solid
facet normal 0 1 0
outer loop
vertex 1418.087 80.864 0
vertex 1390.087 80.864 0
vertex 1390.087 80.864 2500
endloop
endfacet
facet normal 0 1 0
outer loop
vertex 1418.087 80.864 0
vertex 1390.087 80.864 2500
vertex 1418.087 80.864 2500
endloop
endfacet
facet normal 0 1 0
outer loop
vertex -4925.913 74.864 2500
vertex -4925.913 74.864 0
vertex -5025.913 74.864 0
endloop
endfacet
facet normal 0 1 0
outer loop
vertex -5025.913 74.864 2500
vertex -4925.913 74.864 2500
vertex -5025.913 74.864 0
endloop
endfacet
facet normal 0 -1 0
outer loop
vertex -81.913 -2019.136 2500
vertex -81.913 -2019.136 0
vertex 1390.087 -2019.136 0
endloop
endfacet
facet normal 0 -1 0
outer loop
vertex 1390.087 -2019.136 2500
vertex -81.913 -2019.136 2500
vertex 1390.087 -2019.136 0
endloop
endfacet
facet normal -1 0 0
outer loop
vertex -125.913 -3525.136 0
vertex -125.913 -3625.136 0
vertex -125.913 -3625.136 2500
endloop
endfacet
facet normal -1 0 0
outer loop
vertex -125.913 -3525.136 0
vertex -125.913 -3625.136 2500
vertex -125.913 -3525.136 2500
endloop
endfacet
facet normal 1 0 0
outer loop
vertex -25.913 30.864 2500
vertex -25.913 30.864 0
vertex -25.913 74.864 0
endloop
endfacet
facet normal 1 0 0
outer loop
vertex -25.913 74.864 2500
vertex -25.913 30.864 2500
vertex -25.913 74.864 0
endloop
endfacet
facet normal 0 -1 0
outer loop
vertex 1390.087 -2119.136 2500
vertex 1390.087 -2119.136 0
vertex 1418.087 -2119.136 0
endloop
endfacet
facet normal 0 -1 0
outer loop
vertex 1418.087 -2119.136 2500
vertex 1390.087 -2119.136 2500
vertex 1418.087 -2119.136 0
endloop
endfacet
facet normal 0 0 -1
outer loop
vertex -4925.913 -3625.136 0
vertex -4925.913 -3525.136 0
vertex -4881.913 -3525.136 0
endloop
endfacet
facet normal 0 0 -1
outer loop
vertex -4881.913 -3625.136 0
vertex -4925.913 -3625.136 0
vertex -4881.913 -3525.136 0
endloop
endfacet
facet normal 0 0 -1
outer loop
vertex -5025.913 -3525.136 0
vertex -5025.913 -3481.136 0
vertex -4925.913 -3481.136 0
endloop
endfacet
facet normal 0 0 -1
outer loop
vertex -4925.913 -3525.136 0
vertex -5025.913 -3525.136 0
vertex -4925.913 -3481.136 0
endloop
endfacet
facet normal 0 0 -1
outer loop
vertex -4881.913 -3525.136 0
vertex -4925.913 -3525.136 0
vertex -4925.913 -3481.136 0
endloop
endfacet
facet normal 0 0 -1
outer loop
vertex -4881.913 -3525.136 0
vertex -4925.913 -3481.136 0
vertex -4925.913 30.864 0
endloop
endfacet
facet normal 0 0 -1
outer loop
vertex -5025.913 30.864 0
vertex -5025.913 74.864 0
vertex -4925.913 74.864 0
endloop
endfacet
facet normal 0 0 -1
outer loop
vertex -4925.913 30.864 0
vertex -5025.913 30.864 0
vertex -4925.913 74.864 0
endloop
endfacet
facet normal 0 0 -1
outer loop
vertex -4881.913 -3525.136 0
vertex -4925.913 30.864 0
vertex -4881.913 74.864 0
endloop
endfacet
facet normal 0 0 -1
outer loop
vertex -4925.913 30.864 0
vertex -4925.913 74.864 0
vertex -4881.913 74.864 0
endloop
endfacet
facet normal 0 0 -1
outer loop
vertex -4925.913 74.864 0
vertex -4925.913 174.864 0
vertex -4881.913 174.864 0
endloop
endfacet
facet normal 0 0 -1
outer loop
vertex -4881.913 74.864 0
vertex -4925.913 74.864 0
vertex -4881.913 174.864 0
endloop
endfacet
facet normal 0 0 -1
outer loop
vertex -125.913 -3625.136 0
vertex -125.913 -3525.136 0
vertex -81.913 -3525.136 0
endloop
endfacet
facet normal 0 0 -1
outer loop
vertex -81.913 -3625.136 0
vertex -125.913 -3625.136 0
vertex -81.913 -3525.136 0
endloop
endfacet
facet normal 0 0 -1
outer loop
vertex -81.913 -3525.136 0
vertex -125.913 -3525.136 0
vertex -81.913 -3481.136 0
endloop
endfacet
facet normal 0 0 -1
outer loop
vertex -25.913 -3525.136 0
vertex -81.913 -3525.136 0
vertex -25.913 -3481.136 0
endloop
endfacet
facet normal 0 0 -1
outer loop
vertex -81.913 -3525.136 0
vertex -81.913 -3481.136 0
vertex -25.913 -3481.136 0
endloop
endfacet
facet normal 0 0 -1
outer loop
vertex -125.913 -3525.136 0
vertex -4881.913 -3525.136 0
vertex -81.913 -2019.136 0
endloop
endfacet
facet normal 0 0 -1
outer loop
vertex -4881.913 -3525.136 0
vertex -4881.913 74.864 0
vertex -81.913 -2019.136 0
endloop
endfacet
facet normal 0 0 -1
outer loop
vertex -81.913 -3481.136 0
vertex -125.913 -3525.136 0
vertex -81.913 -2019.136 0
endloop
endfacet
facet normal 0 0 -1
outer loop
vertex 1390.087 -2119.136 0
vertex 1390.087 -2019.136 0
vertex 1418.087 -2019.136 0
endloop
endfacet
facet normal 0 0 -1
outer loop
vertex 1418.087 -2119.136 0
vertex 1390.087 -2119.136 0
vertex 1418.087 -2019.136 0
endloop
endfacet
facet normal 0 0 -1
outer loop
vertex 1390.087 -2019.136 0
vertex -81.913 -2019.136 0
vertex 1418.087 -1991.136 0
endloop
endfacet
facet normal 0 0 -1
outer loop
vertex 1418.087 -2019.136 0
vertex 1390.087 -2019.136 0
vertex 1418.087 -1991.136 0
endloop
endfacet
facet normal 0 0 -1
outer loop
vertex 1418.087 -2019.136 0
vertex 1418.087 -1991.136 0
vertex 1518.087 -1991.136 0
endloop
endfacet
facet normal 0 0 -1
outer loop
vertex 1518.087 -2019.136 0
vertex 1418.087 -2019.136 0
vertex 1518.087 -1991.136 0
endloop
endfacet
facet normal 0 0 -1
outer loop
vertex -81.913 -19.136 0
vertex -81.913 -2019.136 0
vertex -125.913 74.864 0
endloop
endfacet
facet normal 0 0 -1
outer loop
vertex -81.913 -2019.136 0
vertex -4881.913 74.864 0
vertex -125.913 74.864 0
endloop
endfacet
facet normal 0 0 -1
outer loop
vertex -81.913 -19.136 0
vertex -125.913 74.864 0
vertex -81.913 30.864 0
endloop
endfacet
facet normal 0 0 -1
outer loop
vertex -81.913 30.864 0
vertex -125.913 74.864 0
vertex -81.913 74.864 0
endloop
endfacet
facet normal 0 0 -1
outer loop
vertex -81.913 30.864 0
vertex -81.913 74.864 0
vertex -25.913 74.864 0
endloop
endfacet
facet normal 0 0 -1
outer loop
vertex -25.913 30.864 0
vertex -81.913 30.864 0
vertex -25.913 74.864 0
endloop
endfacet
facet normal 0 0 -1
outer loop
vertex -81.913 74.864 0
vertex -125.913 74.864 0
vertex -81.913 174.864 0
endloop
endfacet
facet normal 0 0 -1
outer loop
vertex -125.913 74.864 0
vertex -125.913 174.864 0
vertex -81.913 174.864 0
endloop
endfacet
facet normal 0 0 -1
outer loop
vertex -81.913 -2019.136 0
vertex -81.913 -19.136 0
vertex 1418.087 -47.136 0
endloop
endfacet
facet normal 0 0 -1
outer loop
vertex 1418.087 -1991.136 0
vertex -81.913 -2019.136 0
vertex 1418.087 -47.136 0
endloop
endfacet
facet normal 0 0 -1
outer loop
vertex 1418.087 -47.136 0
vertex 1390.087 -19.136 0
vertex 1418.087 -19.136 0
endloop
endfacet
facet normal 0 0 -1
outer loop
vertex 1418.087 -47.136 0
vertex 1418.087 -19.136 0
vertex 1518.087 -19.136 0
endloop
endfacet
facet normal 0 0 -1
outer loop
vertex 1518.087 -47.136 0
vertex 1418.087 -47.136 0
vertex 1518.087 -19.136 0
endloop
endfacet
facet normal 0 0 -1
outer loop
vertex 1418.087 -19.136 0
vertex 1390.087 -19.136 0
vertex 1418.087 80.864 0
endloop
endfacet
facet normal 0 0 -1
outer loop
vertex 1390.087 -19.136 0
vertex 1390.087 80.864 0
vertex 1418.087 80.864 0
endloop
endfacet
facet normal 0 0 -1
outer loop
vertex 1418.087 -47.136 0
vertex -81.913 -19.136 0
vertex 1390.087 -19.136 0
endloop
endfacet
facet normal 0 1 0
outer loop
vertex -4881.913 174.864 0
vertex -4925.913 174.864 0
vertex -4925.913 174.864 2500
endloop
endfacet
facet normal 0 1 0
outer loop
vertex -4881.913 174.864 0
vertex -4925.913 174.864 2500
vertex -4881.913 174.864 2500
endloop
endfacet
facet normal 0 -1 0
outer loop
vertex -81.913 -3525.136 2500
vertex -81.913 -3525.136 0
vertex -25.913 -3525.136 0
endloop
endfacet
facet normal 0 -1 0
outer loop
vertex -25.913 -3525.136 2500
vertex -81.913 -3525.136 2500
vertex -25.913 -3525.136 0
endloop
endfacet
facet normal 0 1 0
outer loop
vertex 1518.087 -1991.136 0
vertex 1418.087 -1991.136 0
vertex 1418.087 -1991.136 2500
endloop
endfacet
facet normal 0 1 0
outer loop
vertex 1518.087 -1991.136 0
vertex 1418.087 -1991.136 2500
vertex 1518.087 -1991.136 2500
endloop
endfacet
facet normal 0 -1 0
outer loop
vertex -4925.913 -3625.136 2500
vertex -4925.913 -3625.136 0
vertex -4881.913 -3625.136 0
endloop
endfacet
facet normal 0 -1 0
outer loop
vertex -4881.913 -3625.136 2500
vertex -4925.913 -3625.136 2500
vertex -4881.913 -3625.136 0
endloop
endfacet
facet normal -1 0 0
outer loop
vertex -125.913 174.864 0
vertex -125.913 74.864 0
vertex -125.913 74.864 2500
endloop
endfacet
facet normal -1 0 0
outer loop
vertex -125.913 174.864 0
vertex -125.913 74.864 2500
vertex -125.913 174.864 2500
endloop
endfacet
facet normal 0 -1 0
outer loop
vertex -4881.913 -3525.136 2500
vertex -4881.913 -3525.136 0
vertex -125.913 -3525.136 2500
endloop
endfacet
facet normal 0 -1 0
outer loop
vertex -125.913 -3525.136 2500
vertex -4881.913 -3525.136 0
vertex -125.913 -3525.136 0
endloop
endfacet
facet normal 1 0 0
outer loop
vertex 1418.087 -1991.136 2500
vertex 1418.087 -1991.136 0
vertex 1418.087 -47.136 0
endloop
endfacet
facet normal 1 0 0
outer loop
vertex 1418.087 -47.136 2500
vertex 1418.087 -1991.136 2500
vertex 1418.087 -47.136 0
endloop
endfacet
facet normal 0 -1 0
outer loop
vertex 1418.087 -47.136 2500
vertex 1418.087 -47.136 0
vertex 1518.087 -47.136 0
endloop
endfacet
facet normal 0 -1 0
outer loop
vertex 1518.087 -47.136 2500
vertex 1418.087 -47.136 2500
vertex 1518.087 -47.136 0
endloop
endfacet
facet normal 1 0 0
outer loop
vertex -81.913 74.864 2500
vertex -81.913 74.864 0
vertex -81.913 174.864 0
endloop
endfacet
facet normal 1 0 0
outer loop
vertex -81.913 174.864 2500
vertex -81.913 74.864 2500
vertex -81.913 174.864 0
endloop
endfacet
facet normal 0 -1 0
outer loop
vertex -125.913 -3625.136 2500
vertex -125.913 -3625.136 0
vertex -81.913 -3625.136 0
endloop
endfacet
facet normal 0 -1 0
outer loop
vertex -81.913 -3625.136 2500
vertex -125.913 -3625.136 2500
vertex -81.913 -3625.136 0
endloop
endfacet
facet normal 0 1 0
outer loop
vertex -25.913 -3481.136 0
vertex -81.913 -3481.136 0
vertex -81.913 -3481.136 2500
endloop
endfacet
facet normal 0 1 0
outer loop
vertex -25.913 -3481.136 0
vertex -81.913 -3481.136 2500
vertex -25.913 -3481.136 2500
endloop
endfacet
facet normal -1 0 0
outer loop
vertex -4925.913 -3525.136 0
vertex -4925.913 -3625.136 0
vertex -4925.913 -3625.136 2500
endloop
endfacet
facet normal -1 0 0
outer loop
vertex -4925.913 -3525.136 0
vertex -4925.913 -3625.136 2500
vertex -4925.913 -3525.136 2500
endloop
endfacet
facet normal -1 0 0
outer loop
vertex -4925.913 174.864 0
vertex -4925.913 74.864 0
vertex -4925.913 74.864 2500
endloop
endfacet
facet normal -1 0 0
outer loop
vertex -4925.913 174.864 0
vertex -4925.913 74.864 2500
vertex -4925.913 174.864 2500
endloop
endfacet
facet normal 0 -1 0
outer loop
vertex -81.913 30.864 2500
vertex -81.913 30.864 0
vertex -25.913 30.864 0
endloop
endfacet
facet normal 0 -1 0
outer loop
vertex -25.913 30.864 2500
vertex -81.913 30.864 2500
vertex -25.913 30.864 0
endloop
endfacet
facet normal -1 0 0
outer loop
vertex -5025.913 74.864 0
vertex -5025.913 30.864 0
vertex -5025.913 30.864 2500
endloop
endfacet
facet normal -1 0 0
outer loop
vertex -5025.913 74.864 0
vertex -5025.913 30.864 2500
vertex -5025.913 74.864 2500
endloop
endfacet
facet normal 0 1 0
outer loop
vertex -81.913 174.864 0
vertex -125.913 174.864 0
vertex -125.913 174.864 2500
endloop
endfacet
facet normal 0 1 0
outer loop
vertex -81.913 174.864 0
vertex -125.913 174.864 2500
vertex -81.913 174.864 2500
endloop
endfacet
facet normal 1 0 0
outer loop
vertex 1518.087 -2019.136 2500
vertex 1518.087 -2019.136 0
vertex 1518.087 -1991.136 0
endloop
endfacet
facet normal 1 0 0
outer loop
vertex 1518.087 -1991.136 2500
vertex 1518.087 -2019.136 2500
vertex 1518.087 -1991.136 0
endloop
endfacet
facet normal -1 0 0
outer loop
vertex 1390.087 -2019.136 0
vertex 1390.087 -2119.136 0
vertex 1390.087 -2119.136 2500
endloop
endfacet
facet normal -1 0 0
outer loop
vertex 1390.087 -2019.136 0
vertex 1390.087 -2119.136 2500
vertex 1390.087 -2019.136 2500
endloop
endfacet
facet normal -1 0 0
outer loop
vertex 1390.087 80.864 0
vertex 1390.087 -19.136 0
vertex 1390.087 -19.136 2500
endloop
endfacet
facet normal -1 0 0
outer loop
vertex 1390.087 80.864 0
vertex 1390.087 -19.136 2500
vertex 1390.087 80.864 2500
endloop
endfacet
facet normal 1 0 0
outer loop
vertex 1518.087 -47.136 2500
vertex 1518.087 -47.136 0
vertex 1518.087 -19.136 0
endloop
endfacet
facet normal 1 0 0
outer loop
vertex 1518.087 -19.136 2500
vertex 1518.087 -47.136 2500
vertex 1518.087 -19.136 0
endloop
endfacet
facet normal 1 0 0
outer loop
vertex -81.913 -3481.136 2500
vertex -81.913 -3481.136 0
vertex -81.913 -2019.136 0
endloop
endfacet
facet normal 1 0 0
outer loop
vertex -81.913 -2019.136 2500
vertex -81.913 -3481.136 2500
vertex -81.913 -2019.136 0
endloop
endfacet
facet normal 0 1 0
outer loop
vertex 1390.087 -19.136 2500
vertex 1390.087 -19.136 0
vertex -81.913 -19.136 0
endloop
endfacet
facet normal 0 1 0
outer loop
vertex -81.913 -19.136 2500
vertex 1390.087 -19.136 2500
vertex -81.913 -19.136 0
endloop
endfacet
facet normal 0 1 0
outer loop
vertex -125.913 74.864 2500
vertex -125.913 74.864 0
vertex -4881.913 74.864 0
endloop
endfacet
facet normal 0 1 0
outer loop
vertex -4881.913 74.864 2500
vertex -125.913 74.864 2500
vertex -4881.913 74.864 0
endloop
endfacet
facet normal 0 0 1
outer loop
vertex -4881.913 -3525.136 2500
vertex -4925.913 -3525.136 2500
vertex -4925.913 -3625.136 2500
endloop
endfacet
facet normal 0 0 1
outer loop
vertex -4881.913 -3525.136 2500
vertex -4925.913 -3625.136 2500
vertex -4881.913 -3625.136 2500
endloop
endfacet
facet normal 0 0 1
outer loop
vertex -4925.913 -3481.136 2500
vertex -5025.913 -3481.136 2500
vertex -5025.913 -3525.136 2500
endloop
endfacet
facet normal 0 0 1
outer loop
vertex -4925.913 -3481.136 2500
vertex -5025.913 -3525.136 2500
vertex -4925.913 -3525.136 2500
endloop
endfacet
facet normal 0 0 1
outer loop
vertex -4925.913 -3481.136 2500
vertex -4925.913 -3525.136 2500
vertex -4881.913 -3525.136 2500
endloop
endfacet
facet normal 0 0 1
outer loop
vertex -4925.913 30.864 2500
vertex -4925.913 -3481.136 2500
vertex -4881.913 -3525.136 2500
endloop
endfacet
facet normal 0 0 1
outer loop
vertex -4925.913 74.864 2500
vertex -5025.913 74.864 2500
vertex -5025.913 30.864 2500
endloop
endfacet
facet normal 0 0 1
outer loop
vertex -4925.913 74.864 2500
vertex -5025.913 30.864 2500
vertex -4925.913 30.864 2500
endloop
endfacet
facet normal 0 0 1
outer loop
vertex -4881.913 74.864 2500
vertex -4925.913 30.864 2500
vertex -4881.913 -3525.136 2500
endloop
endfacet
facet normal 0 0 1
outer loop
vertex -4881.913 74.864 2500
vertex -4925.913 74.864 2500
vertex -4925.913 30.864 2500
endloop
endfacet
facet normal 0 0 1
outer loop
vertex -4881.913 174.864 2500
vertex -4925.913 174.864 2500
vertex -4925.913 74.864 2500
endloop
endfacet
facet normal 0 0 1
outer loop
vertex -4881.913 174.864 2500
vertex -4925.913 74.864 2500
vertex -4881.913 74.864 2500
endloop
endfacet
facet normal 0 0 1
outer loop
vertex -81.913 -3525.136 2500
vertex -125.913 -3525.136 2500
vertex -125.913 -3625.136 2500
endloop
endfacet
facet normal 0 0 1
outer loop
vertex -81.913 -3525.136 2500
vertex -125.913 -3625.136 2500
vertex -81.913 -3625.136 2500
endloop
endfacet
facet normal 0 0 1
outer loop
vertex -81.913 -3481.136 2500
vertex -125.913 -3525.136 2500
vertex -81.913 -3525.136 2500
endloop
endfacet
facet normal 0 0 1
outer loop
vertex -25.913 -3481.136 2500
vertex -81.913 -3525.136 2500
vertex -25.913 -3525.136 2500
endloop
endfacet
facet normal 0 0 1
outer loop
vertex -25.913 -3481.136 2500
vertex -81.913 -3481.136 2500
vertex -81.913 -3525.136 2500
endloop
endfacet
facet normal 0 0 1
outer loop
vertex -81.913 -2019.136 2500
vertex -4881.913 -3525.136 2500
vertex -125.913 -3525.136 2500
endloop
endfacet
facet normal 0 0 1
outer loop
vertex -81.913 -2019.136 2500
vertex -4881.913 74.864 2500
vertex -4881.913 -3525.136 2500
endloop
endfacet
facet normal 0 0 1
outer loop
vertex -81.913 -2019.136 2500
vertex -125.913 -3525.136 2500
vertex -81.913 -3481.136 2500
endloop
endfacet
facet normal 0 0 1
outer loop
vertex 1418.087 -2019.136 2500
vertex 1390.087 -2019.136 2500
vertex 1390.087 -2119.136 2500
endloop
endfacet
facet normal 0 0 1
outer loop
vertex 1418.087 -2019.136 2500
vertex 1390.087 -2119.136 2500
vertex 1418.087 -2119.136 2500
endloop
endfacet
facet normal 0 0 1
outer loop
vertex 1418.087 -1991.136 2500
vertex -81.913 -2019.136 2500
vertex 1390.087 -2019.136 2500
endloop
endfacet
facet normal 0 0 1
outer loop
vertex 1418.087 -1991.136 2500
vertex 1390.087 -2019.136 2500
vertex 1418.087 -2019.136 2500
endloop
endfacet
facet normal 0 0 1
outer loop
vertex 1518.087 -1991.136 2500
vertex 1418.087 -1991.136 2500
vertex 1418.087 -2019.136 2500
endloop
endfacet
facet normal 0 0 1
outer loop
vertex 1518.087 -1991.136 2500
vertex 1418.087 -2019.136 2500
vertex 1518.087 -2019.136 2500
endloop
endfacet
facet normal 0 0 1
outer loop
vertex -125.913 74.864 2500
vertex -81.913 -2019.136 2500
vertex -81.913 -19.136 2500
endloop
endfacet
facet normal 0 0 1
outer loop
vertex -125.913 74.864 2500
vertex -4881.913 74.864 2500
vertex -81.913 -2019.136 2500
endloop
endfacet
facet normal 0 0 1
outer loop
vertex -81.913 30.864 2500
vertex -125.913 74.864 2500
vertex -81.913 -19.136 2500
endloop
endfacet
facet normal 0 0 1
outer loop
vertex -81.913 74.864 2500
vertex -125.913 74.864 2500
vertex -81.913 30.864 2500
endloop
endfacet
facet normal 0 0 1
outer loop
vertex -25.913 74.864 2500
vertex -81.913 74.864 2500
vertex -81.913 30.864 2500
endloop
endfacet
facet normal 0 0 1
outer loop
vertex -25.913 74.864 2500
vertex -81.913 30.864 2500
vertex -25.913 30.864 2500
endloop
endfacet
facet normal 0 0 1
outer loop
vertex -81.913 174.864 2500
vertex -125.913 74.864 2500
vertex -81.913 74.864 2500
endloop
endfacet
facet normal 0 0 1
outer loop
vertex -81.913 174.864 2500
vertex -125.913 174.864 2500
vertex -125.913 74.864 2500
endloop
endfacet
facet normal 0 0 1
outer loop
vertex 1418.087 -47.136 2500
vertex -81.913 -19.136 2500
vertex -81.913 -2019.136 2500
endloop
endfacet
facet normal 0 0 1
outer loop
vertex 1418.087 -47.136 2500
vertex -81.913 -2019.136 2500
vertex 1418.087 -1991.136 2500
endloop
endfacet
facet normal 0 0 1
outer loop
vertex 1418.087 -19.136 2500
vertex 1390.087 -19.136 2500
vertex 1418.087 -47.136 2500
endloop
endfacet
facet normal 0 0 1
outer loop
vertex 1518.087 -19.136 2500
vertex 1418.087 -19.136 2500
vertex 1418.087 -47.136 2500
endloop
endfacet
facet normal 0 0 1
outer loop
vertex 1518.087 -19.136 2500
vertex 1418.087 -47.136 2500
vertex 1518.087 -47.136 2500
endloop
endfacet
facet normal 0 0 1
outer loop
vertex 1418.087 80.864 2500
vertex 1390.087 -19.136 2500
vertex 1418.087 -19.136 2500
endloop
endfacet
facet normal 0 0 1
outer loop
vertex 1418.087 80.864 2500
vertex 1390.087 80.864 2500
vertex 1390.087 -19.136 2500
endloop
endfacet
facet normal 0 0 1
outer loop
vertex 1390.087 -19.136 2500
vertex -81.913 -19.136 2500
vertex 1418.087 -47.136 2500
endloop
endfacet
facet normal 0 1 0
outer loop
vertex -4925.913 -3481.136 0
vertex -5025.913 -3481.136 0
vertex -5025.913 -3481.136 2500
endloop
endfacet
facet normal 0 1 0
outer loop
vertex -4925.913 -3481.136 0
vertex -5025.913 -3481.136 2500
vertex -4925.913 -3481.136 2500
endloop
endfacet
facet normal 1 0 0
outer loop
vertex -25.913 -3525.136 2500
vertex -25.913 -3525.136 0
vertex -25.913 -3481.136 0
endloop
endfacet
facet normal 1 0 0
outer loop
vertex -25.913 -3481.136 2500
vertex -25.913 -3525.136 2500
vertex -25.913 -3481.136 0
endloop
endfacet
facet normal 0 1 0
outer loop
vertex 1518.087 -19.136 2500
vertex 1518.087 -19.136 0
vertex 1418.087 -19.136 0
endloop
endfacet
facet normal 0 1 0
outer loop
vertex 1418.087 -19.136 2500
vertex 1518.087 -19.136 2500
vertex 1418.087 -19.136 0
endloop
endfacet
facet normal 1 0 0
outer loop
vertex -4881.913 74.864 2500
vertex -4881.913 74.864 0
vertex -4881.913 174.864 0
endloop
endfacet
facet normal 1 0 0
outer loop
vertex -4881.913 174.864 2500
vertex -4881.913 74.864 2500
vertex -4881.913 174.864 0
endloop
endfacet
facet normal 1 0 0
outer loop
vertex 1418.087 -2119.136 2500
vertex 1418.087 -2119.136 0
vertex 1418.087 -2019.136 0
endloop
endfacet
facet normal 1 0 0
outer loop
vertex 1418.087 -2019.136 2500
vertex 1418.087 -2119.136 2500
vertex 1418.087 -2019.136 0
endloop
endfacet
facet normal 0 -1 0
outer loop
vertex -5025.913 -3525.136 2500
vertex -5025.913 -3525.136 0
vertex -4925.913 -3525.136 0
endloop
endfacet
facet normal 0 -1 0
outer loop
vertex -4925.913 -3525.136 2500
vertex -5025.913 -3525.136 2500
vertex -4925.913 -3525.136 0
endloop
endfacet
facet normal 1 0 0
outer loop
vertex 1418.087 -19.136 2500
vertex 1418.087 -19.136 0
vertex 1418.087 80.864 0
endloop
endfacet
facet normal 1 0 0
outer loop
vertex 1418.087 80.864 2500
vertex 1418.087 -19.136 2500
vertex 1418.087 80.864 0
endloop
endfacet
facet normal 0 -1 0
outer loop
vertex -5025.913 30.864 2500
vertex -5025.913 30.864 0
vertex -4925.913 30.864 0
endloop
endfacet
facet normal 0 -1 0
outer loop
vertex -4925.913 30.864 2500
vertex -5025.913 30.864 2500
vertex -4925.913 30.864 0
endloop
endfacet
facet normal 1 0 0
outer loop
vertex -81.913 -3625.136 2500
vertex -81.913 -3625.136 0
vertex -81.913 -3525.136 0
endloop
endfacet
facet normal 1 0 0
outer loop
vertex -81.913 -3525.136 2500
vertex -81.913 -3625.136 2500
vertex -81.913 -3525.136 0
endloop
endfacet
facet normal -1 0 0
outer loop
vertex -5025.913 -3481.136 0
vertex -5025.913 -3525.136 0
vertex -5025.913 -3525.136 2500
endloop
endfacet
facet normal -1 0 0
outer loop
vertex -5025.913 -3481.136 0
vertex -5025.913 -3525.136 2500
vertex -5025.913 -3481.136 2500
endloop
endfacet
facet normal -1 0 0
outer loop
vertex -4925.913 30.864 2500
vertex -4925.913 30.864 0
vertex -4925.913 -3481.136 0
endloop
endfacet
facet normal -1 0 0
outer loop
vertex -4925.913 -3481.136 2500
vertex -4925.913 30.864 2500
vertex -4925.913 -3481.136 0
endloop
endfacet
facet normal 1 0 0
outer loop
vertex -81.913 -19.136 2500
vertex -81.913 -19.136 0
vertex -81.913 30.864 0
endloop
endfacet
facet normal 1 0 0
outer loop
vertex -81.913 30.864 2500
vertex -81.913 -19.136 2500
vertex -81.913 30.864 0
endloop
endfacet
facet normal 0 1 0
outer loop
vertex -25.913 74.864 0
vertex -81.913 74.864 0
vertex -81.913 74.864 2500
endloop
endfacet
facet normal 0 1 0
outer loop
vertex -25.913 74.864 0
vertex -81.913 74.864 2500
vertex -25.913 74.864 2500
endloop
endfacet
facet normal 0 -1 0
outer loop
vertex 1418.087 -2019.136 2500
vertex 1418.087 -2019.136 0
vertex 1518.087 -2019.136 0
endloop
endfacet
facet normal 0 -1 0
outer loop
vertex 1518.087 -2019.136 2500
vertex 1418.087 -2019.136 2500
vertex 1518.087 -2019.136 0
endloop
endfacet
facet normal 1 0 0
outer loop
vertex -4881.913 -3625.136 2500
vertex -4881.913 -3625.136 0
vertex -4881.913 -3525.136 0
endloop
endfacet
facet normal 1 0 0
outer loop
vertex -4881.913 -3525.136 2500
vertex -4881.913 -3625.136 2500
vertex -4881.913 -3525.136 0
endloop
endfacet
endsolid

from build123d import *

# Parameters (mm, degrees)
F0_W     = 4756
F0_H     = 3512
F0_W_2   = 44
F0_W_3   = 1472
F0_H_2   = 1944
F0_W_4   = 28
F0_H_3   = 28
F0_H_4   = 44
F0_W_5   = 100
F0_H_5   = 100
F0_W_6   = 56
F1_DEPTH = 2500


with BuildPart() as f1:
    # F0 (on Top) → F1 (new body)
    with BuildSketch(Plane.XY):
        Polygon((-81.9130690247, 30.8643540591), (-125.9130690247, 30.8643540591), (-125.9130690247, -3481.1356459409), (-81.9130690247, -3481.1356459409), (-81.9130690247, -2019.1356459409), (-81.9130690247, -1991.1356459409), (-81.9130690247, -47.1356459409), (-81.9130690247, -19.1356459409), align=None)
        with Locations((-2503.9130690247, -1725.1356459409)):
            Rectangle(F0_W, F0_H)
        with Locations((-4903.9130690247, -1725.1356459409)):
            Rectangle(F0_W_2, F0_H)
        with Locations((654.0869309753, -1019.1356459409)):
            Rectangle(F0_W_3, F0_H_2)
        with Locations((1404.0869309753, -33.1356459409)):
            Rectangle(F0_W_4, F0_H_3)
        with Locations((-103.9130690247, -3503.1356459409)):
            Rectangle(F0_W_2, F0_H_4)
        with Locations((-4903.9130690247, 52.8643540591)):
            Rectangle(F0_W_2, F0_H_4)
        with Locations((1404.0869309753, -1019.1356459409)):
            Rectangle(F0_W_4, F0_H_2)
        with Locations((654.0869309753, -33.1356459409)):
            Rectangle(F0_W_3, F0_H_3)
        with Locations((1404.0869309753, -2005.1356459409)):
            Rectangle(F0_W_4, F0_H_3)
        with Locations((-2503.9130690247, -3503.1356459409)):
            Rectangle(F0_W, F0_H_4)
        with Locations((-4975.9130690247, 52.8643540591)):
            Rectangle(F0_W_5, F0_H_4)
        with Locations((-4903.9130690247, -3503.1356459409)):
            Rectangle(F0_W_2, F0_H_4)
        with Locations((-4975.9130690247, -3503.1356459409)):
            Rectangle(F0_W_5, F0_H_4)
        with Locations((654.0869309753, -2005.1356459409)):
            Rectangle(F0_W_3, F0_H_3)
        with Locations((1468.0869309753, -33.1356459409)):
            Rectangle(F0_W_5, F0_H_3)
        with Locations((1468.0869309753, -2005.1356459409)):
            Rectangle(F0_W_5, F0_H_3)
        with Locations((-2503.9130690247, 52.8643540591)):
            Rectangle(F0_W, F0_H_4)
        with Locations((-4903.9130690247, 124.8643540591)):
            Rectangle(F0_W_2, F0_H_5)
        with Locations((-103.9130690247, 124.8643540591)):
            Rectangle(F0_W_2, F0_H_5)
        with Locations((-103.9130690247, 52.8643540591)):
            Rectangle(F0_W_2, F0_H_4)
        with Locations((-4903.9130690247, -3575.1356459409)):
            Rectangle(F0_W_2, F0_H_5)
        with Locations((-103.9130690247, -3575.1356459409)):
            Rectangle(F0_W_2, F0_H_5)
        with Locations((-53.9130690247, -3503.1356459409)):
            Rectangle(F0_W_6, F0_H_4)
        with Locations((1404.0869309753, 30.8643540591)):
            Rectangle(F0_W_4, F0_H_5)
        with Locations((1404.0869309753, -2069.1356459409)):
            Rectangle(F0_W_4, F0_H_5)
        with Locations((-53.9130690247, 52.8643540591)):
            Rectangle(F0_W_6, F0_H_4)
    extrude(amount=F1_DEPTH)


solid = f1.part
